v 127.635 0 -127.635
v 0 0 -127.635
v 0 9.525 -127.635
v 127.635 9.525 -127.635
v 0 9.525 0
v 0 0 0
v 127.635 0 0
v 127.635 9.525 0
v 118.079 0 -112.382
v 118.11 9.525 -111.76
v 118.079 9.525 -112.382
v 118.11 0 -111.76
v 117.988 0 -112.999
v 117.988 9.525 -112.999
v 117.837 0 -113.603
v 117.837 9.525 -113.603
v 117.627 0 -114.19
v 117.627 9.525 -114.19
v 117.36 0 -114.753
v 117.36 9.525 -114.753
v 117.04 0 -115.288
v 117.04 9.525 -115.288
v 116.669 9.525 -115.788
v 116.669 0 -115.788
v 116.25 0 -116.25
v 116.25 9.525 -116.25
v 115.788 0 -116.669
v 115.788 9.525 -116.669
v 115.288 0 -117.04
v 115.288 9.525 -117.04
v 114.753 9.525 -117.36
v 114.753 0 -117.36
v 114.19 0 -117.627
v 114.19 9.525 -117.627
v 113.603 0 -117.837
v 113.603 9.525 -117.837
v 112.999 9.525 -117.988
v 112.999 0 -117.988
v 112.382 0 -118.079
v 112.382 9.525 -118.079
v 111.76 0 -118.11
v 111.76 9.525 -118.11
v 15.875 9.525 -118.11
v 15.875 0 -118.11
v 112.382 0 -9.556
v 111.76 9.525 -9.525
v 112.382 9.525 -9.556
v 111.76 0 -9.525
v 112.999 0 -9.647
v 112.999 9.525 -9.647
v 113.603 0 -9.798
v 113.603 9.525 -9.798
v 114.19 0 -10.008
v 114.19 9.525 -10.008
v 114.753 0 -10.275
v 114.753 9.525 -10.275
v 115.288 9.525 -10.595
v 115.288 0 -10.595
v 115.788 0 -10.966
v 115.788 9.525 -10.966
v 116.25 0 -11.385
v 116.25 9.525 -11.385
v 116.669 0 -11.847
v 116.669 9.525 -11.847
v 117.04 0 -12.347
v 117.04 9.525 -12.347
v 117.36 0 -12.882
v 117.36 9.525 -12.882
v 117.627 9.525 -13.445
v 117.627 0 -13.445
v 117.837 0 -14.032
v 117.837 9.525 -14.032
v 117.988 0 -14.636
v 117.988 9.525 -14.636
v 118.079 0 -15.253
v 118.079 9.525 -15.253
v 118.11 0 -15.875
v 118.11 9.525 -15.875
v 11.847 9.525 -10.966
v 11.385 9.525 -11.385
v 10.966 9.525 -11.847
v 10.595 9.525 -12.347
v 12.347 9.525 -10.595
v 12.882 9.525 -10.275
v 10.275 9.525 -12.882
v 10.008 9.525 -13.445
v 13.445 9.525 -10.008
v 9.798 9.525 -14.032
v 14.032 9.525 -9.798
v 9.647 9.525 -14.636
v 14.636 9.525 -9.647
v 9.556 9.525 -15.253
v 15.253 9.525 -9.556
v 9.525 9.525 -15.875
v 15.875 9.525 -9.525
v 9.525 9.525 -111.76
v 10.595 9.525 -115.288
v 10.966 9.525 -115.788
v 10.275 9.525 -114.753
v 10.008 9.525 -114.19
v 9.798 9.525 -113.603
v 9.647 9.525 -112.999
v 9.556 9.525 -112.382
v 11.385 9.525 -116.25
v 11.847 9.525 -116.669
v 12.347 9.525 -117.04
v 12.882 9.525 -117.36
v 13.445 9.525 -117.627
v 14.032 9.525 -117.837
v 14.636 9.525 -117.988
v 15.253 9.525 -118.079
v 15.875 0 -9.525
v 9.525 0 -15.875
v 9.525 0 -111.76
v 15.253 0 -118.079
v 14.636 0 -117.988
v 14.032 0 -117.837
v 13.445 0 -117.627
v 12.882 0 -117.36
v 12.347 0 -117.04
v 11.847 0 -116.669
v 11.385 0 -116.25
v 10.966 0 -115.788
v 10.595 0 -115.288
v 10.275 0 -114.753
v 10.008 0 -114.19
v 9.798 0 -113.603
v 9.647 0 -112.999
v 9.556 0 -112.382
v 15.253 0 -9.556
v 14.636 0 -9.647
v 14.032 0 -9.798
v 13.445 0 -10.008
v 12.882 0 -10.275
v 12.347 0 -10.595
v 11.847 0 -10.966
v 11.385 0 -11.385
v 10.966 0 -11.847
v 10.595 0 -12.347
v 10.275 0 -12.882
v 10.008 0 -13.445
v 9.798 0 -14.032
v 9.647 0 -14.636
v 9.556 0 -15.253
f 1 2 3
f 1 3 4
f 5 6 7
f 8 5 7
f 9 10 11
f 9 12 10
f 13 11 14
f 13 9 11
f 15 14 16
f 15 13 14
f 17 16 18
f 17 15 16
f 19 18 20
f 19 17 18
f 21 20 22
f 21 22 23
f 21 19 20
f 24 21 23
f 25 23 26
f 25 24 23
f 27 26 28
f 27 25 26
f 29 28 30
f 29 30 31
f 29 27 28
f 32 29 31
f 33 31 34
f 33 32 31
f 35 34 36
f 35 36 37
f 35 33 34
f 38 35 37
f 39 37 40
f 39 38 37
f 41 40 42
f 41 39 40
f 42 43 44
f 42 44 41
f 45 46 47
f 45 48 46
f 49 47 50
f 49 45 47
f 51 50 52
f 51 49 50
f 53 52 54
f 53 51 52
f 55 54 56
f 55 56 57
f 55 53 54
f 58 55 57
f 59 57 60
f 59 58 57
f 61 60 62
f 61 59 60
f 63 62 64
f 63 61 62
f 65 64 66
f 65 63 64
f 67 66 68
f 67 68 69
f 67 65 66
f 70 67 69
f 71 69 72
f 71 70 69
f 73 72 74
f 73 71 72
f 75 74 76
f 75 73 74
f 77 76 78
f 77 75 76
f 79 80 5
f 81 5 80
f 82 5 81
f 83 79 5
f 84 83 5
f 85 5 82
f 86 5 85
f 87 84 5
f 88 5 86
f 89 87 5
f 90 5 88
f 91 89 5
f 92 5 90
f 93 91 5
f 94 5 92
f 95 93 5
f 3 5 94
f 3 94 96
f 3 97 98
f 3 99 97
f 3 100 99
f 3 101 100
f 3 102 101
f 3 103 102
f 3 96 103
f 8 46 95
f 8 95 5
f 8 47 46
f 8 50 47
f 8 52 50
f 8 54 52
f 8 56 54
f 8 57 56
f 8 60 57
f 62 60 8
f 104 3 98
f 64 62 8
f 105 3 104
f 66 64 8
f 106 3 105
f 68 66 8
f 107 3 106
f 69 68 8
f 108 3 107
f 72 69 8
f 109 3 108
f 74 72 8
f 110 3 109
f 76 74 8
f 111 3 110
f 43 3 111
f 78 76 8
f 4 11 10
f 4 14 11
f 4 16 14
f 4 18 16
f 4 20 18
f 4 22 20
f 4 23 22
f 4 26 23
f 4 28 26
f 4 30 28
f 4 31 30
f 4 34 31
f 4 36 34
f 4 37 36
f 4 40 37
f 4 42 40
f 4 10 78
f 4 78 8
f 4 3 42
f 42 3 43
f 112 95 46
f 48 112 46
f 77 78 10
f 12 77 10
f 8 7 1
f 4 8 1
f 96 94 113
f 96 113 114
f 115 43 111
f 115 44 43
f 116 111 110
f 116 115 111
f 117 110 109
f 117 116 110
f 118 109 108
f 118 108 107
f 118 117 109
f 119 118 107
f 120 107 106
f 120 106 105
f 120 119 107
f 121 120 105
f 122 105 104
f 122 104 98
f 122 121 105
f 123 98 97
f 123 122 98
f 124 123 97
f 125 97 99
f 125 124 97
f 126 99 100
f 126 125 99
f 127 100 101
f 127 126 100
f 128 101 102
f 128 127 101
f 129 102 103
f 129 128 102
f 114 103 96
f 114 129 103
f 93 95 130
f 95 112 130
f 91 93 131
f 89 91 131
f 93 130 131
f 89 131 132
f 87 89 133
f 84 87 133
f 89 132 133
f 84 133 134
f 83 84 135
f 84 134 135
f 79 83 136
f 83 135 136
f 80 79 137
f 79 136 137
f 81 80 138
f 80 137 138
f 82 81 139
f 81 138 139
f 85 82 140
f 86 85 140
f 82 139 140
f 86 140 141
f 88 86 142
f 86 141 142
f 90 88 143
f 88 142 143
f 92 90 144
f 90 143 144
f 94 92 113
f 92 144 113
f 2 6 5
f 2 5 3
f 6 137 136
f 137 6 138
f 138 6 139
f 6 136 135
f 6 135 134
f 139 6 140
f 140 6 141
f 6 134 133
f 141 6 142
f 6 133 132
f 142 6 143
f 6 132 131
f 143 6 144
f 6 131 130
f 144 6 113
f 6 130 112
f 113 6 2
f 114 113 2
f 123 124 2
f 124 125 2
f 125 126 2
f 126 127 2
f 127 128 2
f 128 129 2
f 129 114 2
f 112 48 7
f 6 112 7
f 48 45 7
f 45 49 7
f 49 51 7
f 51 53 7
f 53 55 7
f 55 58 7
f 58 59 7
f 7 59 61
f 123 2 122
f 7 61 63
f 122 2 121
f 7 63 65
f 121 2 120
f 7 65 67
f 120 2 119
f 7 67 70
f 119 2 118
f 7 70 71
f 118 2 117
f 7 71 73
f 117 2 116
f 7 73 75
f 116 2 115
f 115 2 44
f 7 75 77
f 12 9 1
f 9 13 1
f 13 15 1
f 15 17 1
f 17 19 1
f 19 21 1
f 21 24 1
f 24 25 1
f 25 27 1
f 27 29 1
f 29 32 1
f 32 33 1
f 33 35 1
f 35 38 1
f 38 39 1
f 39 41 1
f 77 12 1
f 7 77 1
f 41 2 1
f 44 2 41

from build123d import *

# Parameters (mm, degrees)
SKETCH1_W           = 127.635
SKETCH1_H           = 127.635
BOSS_EXTRUDE1_DEPTH = 9.525
SKETCH5_W           = 108.585
SKETCH5_H           = 108.585
CUT_EXTRUDE1_DEPTH  = 9.525
FILLET1_R           = 6.35


with BuildPart() as part:
    # Sketch1 → Boss-Extrude1 (new body)
    with BuildSketch(Plane(origin=(0, 0, 0), x_dir=(1, 0, 0), z_dir=(0, 1, 0))):
        with Locations((63.8175, 63.8175)):
            Rectangle(SKETCH1_W, SKETCH1_H)
    extrude(amount=BOSS_EXTRUDE1_DEPTH)

    # Sketch5 → Cut-Extrude1 (cut)
    with BuildSketch(Plane(origin=(0, 9.525, 0), x_dir=(1, 0, 0), z_dir=(0, 1, 0))):
        with Locations((63.8175, 63.8175)):
            Rectangle(SKETCH5_W, SKETCH5_H)
    extrude(amount=-CUT_EXTRUDE1_DEPTH, mode=Mode.SUBTRACT)

    # Fillet1
    fillet1_edges = [part.edges().sort_by_distance(p)[0] for p in [
        (118.11, 4.7625, -9.525),
        (9.525, 4.7625, -9.525),
        (9.525, 4.7625, -118.11),
        (118.11, 4.7625, -118.11),
    ]]
    fillet(fillet1_edges, radius=FILLET1_R)


solid = part.part
